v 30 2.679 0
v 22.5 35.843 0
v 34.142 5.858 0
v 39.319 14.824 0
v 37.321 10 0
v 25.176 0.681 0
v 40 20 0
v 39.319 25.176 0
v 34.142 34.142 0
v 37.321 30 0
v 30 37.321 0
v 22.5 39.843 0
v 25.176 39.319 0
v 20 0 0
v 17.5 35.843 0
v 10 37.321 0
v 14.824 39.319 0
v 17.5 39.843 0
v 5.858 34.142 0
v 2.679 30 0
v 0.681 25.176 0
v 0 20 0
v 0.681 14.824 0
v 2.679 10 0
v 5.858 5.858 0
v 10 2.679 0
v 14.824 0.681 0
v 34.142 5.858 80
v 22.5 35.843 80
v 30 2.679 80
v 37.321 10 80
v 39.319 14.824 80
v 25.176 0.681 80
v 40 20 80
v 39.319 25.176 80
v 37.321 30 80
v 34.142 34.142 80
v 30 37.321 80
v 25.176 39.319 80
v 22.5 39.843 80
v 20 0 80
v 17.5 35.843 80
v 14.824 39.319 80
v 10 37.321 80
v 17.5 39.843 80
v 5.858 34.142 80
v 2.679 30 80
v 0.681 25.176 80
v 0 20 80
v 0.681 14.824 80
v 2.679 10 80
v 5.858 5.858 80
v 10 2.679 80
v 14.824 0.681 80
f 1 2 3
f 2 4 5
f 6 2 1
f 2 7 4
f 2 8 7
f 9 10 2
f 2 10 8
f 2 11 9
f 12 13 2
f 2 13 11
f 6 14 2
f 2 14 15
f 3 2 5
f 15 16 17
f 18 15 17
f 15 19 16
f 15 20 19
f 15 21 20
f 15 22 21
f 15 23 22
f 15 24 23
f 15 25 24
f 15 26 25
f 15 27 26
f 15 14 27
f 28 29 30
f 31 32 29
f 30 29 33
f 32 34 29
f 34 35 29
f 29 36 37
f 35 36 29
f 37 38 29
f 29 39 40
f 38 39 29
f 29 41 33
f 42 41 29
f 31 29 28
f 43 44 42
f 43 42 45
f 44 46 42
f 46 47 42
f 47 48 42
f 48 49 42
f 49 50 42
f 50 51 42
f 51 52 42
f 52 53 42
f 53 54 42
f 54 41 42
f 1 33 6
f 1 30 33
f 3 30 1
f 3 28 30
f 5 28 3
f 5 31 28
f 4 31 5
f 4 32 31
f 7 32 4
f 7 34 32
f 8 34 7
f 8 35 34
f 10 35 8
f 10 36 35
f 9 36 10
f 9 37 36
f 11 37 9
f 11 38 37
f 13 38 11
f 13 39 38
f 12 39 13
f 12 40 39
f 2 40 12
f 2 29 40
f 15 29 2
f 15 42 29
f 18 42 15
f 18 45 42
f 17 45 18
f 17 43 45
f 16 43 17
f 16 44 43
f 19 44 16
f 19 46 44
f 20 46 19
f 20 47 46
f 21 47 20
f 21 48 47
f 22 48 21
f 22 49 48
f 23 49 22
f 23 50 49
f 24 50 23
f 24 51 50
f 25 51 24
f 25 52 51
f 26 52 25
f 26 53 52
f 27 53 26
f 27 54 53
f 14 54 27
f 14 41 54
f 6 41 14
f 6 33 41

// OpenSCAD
$fn = 32;

// ----------------------------------------------------------------------
// Keyway shaft: d40 shaft, key 5 x 4 mm
// ----------------------------------------------------------------------

// --- parameters (mm) ---
shaft_r = 20;             // shaft radius
key_w = 5;                // keyway width
key_d = 4;                // keyway depth below the surface line
plate_t = 80;             // shaft length, Z (extrusion height)

shaft_d = 2 * shaft_r;  // shaft diameter
circle_step = 15;  // polygon sampling step, degrees

profile = [[14.824, 39.319], [10, 37.321], [5.858, 34.142], [2.679, 30], [0.681, 25.176], [0, 20], [0.681, 14.824], [2.679, 10], [5.858, 5.858], [10, 2.679], [14.824, 0.681], [20, 0], [25.176, 0.681], [30, 2.679], [34.142, 5.858], [37.321, 10], [39.319, 14.824], [40, 20], [39.319, 25.176], [37.321, 30], [34.142, 34.142], [30, 37.321], [25.176, 39.319], [22.5, 39.843], [22.5, 35.843], [17.5, 35.843], [17.5, 39.843]];  // primary outline, 27 points, counter clockwise

// --- the one profile operation ---
linear_extrude(height = plate_t) polygon(points = profile);
